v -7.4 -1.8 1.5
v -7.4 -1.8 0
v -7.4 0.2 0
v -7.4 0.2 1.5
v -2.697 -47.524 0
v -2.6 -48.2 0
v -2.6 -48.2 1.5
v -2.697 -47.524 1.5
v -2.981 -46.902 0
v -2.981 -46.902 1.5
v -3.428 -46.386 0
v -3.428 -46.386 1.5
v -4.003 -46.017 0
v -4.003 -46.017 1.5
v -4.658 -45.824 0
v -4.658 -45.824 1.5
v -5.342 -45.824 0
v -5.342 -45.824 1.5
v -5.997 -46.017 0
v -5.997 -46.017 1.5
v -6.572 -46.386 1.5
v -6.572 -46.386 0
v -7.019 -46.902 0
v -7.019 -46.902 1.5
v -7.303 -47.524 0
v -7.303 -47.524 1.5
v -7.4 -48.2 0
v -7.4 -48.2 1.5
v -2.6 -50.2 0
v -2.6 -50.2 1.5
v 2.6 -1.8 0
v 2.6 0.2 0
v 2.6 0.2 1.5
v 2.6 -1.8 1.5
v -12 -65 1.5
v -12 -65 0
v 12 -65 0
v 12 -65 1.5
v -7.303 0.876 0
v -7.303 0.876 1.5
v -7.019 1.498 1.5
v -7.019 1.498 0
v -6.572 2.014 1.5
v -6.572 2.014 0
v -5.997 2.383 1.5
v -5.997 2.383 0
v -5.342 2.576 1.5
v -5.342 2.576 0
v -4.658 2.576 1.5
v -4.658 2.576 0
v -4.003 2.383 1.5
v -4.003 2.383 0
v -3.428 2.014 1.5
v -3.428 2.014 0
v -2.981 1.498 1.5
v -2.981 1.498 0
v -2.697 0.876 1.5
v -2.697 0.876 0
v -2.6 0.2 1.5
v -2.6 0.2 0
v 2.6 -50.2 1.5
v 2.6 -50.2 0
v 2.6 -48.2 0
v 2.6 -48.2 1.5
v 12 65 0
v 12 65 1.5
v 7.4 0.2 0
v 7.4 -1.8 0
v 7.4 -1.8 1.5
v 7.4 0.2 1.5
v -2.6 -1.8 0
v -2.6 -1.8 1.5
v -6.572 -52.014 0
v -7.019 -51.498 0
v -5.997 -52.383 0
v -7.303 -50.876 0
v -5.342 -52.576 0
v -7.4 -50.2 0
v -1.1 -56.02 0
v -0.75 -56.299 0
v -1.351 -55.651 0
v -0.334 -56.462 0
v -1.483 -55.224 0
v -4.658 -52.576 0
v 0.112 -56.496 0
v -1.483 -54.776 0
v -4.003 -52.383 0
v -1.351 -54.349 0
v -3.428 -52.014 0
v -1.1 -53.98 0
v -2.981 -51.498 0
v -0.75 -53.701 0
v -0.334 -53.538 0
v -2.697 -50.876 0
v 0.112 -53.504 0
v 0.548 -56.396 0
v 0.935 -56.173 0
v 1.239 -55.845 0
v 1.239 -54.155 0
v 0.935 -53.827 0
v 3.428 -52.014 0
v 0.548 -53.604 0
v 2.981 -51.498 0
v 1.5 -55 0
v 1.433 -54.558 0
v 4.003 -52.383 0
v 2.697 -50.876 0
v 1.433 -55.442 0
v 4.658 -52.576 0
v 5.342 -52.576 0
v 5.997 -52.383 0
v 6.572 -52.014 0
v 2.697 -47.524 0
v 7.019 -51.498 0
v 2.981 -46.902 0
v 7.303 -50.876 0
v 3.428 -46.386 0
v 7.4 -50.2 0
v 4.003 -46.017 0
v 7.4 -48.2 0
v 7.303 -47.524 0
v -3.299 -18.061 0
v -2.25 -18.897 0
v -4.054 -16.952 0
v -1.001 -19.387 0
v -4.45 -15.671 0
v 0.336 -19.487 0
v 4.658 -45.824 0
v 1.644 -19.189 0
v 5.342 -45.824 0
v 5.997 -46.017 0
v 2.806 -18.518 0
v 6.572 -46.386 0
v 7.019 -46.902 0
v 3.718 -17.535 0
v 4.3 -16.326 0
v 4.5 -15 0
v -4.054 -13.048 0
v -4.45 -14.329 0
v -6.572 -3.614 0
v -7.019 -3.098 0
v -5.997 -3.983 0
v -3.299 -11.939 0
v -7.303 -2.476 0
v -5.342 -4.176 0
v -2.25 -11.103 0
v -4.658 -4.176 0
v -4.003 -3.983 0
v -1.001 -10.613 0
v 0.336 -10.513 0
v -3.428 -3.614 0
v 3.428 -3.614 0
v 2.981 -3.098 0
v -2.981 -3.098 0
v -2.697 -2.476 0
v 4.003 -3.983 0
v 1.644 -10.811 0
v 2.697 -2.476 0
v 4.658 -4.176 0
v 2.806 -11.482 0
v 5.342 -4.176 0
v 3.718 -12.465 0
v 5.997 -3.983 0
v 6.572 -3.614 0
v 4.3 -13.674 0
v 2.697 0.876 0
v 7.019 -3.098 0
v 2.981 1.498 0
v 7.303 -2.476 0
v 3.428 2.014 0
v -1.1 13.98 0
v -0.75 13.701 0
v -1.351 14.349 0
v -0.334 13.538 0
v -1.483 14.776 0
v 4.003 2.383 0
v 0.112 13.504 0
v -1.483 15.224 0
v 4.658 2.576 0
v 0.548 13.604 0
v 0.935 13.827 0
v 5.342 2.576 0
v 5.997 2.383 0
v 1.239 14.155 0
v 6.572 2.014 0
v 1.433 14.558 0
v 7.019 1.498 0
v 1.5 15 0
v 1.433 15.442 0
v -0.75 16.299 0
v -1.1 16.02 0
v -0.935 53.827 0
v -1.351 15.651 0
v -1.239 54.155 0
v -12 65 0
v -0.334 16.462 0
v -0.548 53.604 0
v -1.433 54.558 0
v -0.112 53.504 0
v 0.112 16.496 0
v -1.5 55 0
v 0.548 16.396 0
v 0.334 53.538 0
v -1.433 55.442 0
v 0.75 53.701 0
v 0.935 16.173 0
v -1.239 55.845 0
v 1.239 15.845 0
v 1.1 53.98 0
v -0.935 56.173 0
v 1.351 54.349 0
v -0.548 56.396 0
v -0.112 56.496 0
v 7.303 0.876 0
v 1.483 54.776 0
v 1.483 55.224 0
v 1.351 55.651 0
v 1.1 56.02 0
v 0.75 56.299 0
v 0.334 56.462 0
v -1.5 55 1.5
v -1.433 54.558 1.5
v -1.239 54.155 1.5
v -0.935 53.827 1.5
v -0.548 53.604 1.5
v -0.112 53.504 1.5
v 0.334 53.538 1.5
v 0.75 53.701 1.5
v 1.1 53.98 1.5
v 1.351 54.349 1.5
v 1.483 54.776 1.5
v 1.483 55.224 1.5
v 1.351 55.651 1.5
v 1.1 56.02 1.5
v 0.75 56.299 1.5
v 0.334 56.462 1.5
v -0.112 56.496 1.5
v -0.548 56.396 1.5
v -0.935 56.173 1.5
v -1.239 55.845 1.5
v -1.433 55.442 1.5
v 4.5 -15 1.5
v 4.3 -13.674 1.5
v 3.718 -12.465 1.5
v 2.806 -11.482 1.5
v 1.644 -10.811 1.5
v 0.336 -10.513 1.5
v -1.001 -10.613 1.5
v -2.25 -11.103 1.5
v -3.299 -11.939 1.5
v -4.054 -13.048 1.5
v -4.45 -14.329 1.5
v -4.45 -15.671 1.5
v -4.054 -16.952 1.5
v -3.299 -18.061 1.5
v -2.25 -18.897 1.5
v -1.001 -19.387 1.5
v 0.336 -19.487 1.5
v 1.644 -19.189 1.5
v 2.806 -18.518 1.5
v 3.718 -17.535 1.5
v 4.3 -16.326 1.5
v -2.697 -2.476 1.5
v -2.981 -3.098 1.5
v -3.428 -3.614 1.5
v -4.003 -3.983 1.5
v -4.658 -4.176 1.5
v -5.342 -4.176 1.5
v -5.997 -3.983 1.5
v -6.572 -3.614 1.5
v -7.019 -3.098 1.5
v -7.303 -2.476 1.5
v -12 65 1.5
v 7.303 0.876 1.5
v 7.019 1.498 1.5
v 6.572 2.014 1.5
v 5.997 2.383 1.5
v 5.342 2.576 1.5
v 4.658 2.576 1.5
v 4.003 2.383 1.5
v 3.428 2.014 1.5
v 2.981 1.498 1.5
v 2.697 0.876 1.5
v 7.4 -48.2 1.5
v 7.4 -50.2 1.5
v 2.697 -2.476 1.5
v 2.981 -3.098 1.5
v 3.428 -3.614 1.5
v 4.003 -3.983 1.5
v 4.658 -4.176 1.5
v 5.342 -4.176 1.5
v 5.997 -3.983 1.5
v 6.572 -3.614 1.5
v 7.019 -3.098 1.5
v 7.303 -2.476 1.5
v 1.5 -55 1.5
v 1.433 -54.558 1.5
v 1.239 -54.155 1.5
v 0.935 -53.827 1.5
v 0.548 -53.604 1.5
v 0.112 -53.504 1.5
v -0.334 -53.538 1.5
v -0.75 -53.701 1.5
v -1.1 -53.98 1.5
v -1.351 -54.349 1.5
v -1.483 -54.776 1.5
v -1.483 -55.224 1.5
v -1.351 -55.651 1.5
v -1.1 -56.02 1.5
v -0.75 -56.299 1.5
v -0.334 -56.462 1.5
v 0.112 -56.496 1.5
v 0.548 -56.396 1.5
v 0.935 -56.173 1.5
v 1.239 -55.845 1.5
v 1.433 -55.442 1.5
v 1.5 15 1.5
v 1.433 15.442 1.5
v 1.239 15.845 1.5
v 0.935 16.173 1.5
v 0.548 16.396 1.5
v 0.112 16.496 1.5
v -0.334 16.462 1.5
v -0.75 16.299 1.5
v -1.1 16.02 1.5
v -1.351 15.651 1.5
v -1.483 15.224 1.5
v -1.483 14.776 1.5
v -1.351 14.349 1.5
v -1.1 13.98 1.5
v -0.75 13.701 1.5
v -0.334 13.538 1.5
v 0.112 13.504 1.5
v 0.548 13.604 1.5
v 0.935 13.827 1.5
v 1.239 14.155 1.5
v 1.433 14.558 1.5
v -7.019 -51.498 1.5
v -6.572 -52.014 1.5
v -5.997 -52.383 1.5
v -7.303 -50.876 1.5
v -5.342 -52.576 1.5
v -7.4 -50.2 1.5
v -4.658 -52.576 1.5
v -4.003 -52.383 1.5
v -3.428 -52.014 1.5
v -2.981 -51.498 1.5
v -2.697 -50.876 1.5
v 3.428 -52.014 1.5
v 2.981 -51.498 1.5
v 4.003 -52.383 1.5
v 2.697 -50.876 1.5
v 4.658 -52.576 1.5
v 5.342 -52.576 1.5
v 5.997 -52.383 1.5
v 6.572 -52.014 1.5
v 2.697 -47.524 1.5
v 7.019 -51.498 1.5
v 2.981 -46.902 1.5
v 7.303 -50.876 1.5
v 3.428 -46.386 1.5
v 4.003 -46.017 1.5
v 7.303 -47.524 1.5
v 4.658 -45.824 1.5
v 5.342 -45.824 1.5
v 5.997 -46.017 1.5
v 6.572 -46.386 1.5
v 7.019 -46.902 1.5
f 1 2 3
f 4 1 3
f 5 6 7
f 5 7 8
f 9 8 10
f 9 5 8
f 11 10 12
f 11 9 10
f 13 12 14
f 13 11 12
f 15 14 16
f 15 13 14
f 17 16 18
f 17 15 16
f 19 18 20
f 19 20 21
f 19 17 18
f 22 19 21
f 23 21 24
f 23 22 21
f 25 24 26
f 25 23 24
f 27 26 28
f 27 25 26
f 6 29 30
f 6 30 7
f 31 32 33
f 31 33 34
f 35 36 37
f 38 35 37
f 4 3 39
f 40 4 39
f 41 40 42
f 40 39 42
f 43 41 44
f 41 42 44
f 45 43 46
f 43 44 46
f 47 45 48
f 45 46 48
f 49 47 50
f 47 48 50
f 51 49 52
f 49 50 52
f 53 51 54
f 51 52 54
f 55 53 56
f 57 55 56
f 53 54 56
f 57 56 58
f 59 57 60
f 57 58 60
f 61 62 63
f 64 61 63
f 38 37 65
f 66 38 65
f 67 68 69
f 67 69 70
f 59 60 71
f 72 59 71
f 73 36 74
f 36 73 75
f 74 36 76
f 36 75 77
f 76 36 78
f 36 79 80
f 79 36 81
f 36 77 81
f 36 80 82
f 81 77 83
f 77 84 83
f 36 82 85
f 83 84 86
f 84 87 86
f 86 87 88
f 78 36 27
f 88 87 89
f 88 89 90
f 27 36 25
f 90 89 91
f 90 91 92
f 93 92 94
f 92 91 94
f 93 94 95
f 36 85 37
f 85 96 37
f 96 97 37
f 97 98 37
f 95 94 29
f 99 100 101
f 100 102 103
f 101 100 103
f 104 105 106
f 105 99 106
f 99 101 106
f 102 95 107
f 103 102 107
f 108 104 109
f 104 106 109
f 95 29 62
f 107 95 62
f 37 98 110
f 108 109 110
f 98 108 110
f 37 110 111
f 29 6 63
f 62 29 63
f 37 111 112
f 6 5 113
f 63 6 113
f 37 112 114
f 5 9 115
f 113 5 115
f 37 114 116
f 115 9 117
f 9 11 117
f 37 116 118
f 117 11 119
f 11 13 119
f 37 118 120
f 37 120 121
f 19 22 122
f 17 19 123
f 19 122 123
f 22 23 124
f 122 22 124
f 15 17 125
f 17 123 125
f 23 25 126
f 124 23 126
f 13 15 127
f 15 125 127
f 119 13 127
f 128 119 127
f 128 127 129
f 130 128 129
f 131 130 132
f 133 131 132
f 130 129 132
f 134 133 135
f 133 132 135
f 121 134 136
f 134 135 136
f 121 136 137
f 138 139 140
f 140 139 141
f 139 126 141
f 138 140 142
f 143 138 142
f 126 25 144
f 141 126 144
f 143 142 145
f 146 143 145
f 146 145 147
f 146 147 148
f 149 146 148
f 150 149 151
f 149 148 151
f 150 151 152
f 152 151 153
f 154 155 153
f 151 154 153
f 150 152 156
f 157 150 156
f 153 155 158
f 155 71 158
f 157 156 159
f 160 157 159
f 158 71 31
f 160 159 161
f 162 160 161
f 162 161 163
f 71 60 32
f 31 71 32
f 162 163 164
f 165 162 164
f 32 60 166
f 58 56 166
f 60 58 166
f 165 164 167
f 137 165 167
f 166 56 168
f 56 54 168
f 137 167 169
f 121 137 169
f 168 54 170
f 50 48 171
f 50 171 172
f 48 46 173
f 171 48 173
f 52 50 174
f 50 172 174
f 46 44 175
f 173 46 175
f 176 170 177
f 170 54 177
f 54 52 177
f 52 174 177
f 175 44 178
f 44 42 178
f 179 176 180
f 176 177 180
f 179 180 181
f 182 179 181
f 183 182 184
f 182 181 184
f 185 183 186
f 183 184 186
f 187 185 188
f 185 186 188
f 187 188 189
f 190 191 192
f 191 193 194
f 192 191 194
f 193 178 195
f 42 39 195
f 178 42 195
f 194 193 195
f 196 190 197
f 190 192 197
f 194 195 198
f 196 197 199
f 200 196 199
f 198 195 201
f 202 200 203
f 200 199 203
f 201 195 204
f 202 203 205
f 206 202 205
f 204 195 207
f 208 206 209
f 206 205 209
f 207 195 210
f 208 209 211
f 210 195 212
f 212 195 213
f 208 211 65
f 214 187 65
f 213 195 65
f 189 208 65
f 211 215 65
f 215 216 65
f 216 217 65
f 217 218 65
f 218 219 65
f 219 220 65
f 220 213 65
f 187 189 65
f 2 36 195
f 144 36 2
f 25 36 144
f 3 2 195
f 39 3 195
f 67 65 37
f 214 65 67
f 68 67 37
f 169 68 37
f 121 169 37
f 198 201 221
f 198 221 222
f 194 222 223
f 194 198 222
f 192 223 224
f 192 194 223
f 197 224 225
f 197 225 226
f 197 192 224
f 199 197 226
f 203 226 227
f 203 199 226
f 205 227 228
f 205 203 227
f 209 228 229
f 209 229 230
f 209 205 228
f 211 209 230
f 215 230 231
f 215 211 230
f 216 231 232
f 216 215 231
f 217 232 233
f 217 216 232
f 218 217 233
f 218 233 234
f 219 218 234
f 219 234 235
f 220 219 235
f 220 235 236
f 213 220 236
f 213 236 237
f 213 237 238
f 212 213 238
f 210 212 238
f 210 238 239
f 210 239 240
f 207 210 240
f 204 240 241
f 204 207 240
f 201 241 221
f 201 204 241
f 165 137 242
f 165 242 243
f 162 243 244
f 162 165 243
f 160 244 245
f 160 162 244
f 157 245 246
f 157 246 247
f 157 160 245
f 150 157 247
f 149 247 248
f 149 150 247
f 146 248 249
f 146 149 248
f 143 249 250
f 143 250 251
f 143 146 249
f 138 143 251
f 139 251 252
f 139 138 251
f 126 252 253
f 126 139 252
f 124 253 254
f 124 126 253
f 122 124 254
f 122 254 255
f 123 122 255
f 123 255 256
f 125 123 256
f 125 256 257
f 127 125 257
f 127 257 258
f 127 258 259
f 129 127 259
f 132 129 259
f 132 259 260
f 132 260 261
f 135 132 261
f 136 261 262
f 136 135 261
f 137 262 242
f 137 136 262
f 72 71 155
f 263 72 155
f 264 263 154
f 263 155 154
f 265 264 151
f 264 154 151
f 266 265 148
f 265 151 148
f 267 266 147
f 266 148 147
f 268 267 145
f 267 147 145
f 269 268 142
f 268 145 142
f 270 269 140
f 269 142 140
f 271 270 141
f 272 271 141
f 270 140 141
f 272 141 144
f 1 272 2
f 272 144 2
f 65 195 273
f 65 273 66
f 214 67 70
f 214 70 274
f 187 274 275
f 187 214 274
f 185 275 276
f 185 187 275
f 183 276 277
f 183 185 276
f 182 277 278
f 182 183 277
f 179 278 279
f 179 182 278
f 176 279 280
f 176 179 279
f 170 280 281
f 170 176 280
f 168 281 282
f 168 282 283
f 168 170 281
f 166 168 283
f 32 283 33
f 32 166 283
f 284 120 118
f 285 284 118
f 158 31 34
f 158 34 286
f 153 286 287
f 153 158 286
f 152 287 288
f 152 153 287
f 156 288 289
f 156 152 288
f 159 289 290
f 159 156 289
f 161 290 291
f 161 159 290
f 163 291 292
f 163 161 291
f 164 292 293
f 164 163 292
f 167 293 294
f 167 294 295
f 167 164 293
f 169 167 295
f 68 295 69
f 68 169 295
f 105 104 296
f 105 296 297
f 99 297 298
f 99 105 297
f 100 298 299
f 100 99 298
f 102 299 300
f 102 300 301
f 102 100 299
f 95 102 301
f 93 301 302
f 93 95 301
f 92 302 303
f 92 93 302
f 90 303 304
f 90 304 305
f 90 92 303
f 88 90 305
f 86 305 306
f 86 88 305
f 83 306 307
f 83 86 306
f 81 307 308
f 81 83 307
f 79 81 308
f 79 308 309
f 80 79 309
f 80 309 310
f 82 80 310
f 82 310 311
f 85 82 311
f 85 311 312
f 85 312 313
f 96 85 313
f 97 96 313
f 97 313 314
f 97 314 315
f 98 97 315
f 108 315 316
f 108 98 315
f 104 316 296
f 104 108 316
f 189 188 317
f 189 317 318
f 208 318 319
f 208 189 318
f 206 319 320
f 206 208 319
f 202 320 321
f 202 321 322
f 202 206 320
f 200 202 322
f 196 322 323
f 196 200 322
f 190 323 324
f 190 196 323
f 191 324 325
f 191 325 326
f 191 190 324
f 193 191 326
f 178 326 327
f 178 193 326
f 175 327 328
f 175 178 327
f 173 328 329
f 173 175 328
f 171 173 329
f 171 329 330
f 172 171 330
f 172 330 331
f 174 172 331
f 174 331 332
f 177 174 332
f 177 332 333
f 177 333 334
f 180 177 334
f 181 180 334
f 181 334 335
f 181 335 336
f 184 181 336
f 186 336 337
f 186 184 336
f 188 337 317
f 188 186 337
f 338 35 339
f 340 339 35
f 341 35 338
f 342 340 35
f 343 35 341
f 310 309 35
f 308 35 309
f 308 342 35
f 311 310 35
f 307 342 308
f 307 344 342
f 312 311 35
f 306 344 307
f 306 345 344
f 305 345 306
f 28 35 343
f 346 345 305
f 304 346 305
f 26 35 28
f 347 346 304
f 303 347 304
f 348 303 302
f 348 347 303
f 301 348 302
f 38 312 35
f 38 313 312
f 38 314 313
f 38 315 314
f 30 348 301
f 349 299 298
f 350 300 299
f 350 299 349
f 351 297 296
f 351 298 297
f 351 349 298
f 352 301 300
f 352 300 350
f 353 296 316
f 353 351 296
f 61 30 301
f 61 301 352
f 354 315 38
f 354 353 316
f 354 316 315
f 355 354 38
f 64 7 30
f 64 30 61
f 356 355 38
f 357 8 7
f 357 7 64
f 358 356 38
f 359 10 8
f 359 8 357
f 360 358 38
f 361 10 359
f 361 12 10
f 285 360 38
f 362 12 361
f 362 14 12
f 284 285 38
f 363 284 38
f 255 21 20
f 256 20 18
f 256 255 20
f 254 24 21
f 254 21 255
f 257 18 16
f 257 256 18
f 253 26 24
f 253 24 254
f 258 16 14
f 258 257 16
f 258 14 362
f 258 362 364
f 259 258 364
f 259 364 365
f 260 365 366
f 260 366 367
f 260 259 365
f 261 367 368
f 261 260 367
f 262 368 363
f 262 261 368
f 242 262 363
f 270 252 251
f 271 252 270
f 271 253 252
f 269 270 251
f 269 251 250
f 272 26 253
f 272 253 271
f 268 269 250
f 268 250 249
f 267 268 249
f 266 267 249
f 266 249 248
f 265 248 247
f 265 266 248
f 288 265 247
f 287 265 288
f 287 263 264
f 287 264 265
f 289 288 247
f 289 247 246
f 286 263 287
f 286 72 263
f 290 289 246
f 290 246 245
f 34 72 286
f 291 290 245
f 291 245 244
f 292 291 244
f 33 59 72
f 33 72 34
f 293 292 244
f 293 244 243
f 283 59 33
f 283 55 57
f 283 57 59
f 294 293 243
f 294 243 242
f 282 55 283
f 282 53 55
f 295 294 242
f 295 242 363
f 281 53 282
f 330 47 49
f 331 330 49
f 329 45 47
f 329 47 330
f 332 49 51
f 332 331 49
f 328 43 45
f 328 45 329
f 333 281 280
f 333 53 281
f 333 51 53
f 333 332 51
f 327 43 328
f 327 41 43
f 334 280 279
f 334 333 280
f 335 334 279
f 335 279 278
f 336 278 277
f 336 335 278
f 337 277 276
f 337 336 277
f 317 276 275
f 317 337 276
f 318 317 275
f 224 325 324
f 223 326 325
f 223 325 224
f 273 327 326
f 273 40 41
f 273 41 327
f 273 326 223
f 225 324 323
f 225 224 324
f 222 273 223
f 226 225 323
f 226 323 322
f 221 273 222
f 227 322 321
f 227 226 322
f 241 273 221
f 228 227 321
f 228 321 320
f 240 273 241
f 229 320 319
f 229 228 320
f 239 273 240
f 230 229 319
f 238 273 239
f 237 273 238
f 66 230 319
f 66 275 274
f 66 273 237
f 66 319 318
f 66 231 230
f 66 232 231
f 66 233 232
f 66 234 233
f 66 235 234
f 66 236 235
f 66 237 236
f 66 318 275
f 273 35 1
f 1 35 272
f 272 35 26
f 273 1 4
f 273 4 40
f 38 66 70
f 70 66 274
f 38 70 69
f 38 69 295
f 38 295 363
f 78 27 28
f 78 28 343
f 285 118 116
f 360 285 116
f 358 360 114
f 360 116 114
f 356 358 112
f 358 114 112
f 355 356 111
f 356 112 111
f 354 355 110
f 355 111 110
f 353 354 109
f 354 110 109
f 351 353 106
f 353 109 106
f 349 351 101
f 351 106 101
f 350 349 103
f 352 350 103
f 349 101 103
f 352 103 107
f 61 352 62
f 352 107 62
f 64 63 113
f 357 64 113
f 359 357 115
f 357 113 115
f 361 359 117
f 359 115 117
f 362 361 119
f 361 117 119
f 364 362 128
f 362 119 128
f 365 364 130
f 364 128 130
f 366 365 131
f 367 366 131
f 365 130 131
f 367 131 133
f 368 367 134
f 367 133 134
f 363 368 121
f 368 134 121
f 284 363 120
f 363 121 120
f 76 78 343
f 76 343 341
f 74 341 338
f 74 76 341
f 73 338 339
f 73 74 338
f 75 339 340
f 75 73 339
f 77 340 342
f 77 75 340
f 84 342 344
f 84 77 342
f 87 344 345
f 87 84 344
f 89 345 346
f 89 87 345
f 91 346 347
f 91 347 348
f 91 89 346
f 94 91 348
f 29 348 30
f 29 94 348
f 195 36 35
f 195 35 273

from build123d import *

# Parameters (mm, degrees)
SKETCH_1_W      = 24
SKETCH_1_H      = 130
SKETCH_1_R      = 1.5
SKETCH_1_R_2    = 4.5
EXTRUDE_1_DEPTH = 1.5


with BuildPart() as part:
    # 草图1 → 凸台-拉伸1 (new body)
    with BuildSketch(Plane.XY):
        Rectangle(SKETCH_1_W, SKETCH_1_H)
        with Locations((0, 15)):
            Circle(SKETCH_1_R, mode=Mode.SUBTRACT)
        with Locations((0, -55)):
            Circle(SKETCH_1_R, mode=Mode.SUBTRACT)
        with Locations(Location((0, 55, 0), (0, 0, 180))):
            Circle(SKETCH_1_R, mode=Mode.SUBTRACT)
        with Locations((0, -15)):
            Circle(SKETCH_1_R_2, mode=Mode.SUBTRACT)
        with BuildLine():
            Line((-7.4, -1.8), (-7.4, 0.2))
            ThreePointArc((-7.4, 0.2), (-5, 2.6), (-2.6, 0.2))
            Line((-2.6, 0.2), (-2.6, -1.8))
            ThreePointArc((-2.6, -1.8), (-5, -4.2), (-7.4, -1.8))
        make_face(mode=Mode.SUBTRACT)
        with BuildLine():
            Line((7.4, -1.8), (7.4, 0.2))
            ThreePointArc((7.4, 0.2), (5, 2.6), (2.6, 0.2))
            Line((2.6, 0.2), (2.6, -1.8))
            ThreePointArc((2.6, -1.8), (5, -4.2), (7.4, -1.8))
        make_face(mode=Mode.SUBTRACT)
        with BuildLine():
            Line((-7.4, -48.2), (-7.4, -50.2))
            ThreePointArc((-7.4, -50.2), (-5, -52.6), (-2.6, -50.2))
            Line((-2.6, -50.2), (-2.6, -48.2))
            ThreePointArc((-2.6, -48.2), (-5, -45.8), (-7.4, -48.2))
        make_face(mode=Mode.SUBTRACT)
        with BuildLine():
            Line((7.4, -48.2), (7.4, -50.2))
            ThreePointArc((7.4, -50.2), (5, -52.6), (2.6, -50.2))
            Line((2.6, -50.2), (2.6, -48.2))
            ThreePointArc((2.6, -48.2), (5, -45.8), (7.4, -48.2))
        make_face(mode=Mode.SUBTRACT)
    extrude(amount=EXTRUDE_1_DEPTH)


solid = part.part
